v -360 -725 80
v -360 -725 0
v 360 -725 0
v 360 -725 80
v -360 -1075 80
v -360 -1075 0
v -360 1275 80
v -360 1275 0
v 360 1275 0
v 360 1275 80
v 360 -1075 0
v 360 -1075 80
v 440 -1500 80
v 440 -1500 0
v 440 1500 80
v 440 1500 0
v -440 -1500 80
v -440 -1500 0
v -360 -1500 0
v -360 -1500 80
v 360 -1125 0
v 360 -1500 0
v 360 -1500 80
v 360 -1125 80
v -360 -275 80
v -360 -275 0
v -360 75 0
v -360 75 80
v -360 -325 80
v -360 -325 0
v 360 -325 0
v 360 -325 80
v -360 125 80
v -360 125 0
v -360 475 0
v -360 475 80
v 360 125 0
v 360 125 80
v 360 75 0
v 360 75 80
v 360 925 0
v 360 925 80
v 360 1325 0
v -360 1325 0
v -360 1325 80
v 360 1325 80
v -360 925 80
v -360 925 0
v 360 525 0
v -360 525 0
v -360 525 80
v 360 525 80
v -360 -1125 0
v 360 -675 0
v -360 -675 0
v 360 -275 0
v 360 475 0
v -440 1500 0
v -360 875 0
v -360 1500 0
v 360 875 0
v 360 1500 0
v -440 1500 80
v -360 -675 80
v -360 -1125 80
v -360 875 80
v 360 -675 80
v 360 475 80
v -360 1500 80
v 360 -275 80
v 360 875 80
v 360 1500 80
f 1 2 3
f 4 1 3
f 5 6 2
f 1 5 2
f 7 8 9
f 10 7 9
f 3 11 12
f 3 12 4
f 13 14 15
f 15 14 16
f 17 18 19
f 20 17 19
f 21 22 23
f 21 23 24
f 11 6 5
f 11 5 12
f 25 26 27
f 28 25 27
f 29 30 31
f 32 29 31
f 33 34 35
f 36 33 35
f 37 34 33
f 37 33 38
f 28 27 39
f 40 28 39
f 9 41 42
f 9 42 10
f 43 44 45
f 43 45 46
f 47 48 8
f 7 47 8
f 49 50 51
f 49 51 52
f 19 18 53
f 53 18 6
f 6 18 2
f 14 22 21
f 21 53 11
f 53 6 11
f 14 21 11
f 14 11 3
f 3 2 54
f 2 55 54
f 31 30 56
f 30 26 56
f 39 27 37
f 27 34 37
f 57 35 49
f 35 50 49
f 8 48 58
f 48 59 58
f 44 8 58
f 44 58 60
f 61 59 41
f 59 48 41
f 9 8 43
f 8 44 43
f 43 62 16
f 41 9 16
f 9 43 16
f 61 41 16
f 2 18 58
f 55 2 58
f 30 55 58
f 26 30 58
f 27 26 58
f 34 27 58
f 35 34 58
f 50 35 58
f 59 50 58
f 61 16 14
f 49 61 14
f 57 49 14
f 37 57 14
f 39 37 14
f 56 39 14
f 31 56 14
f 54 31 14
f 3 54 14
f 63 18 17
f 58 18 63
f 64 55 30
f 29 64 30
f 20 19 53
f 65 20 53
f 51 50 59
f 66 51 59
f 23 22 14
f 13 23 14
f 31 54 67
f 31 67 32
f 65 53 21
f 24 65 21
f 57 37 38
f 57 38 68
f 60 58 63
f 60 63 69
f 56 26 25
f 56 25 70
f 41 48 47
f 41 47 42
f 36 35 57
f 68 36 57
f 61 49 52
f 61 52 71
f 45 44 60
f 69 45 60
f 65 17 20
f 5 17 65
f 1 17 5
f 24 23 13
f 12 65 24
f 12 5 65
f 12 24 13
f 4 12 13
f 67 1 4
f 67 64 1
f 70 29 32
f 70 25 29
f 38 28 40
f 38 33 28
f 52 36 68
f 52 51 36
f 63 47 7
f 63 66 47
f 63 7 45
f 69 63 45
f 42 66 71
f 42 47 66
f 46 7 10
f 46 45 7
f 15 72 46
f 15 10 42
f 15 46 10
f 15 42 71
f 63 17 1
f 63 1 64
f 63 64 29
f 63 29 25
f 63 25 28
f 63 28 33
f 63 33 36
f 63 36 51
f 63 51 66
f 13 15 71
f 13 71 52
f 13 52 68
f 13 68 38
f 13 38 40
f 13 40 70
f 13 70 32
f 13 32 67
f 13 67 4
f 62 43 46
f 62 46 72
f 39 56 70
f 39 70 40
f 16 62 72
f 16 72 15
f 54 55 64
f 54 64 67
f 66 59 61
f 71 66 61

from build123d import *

# Parameters (mm, degrees)
SKETCH_1_W      = 80
SKETCH_1_H      = 3000
EXTRUDE_1_DEPTH = 80
SKETCH_2_W      = 80
SKETCH_2_H      = 3000
EXTRUDE_2_DEPTH = 80
SKETCH_3_W      = 800
SKETCH_3_H      = 50
EXTRUDE_3_DEPTH = 80
SKETCH_4_W      = 800
SKETCH_4_H      = 50
EXTRUDE_4_DEPTH = 80
SKETCH_5_W      = 800
SKETCH_5_H      = 50
EXTRUDE_5_DEPTH = 80
SKETCH_6_W      = 800
SKETCH_6_H      = 50
EXTRUDE_6_DEPTH = 80
SKETCH_7_W      = 800
SKETCH_7_H      = 50
EXTRUDE_7_DEPTH = 80
SKETCH_8_W      = 800
SKETCH_8_H      = 50
EXTRUDE_8_DEPTH = 80
SKETCH_9_W      = 800
SKETCH_9_H      = 50
EXTRUDE_9_DEPTH = 80


with BuildPart() as part:
    # 草图1 → 凸台-拉伸1 (new body)
    with BuildSketch(Plane.XY):
        with Locations((-400, 0)):
            Rectangle(SKETCH_1_W, SKETCH_1_H)
    extrude(amount=EXTRUDE_1_DEPTH)



with BuildPart() as body_2:
    # 草图2 → 凸台-拉伸2 (new body)
    with BuildSketch(Plane.XY):
        with Locations((400, 0)):
            Rectangle(SKETCH_2_W, SKETCH_2_H)
    extrude(amount=EXTRUDE_2_DEPTH)


with BuildPart() as part_1:
    add(part.part)

    add(body_2.part)  # 凸台-拉伸3 merges body 2
    # 草图3 → 凸台-拉伸3 (add)
    with BuildSketch(Plane.XY):
        with Locations((0, 1300)):
            Rectangle(SKETCH_3_W, SKETCH_3_H)
    extrude(amount=EXTRUDE_3_DEPTH)

    # 草图4 → 凸台-拉伸4 (add)
    with BuildSketch(Plane.XY):
        with Locations((0, 900)):
            Rectangle(SKETCH_4_W, SKETCH_4_H)
    extrude(amount=EXTRUDE_4_DEPTH)

    # 草图5 → 凸台-拉伸5 (add)
    with BuildSketch(Plane.XY):
        with Locations((0, 500)):
            Rectangle(SKETCH_5_W, SKETCH_5_H)
    extrude(amount=EXTRUDE_5_DEPTH)

    # 草图6 → 凸台-拉伸6 (add)
    with BuildSketch(Plane.XY):
        with Locations((0, 100)):
            Rectangle(SKETCH_6_W, SKETCH_6_H)
    extrude(amount=EXTRUDE_6_DEPTH)

    # 草图7 → 凸台-拉伸7 (add)
    with BuildSketch(Plane.XY):
        with Locations((0, -300)):
            Rectangle(SKETCH_7_W, SKETCH_7_H)
    extrude(amount=EXTRUDE_7_DEPTH)

    # 草图8 → 凸台-拉伸8 (add)
    with BuildSketch(Plane.XY):
        with Locations((0, -700)):
            Rectangle(SKETCH_8_W, SKETCH_8_H)
    extrude(amount=EXTRUDE_8_DEPTH)

    # 草图9 → 凸台-拉伸9 (add)
    with BuildSketch(Plane.XY):
        with Locations((0, -1100)):
            Rectangle(SKETCH_9_W, SKETCH_9_H)
    extrude(amount=EXTRUDE_9_DEPTH)


solid = part_1.part
